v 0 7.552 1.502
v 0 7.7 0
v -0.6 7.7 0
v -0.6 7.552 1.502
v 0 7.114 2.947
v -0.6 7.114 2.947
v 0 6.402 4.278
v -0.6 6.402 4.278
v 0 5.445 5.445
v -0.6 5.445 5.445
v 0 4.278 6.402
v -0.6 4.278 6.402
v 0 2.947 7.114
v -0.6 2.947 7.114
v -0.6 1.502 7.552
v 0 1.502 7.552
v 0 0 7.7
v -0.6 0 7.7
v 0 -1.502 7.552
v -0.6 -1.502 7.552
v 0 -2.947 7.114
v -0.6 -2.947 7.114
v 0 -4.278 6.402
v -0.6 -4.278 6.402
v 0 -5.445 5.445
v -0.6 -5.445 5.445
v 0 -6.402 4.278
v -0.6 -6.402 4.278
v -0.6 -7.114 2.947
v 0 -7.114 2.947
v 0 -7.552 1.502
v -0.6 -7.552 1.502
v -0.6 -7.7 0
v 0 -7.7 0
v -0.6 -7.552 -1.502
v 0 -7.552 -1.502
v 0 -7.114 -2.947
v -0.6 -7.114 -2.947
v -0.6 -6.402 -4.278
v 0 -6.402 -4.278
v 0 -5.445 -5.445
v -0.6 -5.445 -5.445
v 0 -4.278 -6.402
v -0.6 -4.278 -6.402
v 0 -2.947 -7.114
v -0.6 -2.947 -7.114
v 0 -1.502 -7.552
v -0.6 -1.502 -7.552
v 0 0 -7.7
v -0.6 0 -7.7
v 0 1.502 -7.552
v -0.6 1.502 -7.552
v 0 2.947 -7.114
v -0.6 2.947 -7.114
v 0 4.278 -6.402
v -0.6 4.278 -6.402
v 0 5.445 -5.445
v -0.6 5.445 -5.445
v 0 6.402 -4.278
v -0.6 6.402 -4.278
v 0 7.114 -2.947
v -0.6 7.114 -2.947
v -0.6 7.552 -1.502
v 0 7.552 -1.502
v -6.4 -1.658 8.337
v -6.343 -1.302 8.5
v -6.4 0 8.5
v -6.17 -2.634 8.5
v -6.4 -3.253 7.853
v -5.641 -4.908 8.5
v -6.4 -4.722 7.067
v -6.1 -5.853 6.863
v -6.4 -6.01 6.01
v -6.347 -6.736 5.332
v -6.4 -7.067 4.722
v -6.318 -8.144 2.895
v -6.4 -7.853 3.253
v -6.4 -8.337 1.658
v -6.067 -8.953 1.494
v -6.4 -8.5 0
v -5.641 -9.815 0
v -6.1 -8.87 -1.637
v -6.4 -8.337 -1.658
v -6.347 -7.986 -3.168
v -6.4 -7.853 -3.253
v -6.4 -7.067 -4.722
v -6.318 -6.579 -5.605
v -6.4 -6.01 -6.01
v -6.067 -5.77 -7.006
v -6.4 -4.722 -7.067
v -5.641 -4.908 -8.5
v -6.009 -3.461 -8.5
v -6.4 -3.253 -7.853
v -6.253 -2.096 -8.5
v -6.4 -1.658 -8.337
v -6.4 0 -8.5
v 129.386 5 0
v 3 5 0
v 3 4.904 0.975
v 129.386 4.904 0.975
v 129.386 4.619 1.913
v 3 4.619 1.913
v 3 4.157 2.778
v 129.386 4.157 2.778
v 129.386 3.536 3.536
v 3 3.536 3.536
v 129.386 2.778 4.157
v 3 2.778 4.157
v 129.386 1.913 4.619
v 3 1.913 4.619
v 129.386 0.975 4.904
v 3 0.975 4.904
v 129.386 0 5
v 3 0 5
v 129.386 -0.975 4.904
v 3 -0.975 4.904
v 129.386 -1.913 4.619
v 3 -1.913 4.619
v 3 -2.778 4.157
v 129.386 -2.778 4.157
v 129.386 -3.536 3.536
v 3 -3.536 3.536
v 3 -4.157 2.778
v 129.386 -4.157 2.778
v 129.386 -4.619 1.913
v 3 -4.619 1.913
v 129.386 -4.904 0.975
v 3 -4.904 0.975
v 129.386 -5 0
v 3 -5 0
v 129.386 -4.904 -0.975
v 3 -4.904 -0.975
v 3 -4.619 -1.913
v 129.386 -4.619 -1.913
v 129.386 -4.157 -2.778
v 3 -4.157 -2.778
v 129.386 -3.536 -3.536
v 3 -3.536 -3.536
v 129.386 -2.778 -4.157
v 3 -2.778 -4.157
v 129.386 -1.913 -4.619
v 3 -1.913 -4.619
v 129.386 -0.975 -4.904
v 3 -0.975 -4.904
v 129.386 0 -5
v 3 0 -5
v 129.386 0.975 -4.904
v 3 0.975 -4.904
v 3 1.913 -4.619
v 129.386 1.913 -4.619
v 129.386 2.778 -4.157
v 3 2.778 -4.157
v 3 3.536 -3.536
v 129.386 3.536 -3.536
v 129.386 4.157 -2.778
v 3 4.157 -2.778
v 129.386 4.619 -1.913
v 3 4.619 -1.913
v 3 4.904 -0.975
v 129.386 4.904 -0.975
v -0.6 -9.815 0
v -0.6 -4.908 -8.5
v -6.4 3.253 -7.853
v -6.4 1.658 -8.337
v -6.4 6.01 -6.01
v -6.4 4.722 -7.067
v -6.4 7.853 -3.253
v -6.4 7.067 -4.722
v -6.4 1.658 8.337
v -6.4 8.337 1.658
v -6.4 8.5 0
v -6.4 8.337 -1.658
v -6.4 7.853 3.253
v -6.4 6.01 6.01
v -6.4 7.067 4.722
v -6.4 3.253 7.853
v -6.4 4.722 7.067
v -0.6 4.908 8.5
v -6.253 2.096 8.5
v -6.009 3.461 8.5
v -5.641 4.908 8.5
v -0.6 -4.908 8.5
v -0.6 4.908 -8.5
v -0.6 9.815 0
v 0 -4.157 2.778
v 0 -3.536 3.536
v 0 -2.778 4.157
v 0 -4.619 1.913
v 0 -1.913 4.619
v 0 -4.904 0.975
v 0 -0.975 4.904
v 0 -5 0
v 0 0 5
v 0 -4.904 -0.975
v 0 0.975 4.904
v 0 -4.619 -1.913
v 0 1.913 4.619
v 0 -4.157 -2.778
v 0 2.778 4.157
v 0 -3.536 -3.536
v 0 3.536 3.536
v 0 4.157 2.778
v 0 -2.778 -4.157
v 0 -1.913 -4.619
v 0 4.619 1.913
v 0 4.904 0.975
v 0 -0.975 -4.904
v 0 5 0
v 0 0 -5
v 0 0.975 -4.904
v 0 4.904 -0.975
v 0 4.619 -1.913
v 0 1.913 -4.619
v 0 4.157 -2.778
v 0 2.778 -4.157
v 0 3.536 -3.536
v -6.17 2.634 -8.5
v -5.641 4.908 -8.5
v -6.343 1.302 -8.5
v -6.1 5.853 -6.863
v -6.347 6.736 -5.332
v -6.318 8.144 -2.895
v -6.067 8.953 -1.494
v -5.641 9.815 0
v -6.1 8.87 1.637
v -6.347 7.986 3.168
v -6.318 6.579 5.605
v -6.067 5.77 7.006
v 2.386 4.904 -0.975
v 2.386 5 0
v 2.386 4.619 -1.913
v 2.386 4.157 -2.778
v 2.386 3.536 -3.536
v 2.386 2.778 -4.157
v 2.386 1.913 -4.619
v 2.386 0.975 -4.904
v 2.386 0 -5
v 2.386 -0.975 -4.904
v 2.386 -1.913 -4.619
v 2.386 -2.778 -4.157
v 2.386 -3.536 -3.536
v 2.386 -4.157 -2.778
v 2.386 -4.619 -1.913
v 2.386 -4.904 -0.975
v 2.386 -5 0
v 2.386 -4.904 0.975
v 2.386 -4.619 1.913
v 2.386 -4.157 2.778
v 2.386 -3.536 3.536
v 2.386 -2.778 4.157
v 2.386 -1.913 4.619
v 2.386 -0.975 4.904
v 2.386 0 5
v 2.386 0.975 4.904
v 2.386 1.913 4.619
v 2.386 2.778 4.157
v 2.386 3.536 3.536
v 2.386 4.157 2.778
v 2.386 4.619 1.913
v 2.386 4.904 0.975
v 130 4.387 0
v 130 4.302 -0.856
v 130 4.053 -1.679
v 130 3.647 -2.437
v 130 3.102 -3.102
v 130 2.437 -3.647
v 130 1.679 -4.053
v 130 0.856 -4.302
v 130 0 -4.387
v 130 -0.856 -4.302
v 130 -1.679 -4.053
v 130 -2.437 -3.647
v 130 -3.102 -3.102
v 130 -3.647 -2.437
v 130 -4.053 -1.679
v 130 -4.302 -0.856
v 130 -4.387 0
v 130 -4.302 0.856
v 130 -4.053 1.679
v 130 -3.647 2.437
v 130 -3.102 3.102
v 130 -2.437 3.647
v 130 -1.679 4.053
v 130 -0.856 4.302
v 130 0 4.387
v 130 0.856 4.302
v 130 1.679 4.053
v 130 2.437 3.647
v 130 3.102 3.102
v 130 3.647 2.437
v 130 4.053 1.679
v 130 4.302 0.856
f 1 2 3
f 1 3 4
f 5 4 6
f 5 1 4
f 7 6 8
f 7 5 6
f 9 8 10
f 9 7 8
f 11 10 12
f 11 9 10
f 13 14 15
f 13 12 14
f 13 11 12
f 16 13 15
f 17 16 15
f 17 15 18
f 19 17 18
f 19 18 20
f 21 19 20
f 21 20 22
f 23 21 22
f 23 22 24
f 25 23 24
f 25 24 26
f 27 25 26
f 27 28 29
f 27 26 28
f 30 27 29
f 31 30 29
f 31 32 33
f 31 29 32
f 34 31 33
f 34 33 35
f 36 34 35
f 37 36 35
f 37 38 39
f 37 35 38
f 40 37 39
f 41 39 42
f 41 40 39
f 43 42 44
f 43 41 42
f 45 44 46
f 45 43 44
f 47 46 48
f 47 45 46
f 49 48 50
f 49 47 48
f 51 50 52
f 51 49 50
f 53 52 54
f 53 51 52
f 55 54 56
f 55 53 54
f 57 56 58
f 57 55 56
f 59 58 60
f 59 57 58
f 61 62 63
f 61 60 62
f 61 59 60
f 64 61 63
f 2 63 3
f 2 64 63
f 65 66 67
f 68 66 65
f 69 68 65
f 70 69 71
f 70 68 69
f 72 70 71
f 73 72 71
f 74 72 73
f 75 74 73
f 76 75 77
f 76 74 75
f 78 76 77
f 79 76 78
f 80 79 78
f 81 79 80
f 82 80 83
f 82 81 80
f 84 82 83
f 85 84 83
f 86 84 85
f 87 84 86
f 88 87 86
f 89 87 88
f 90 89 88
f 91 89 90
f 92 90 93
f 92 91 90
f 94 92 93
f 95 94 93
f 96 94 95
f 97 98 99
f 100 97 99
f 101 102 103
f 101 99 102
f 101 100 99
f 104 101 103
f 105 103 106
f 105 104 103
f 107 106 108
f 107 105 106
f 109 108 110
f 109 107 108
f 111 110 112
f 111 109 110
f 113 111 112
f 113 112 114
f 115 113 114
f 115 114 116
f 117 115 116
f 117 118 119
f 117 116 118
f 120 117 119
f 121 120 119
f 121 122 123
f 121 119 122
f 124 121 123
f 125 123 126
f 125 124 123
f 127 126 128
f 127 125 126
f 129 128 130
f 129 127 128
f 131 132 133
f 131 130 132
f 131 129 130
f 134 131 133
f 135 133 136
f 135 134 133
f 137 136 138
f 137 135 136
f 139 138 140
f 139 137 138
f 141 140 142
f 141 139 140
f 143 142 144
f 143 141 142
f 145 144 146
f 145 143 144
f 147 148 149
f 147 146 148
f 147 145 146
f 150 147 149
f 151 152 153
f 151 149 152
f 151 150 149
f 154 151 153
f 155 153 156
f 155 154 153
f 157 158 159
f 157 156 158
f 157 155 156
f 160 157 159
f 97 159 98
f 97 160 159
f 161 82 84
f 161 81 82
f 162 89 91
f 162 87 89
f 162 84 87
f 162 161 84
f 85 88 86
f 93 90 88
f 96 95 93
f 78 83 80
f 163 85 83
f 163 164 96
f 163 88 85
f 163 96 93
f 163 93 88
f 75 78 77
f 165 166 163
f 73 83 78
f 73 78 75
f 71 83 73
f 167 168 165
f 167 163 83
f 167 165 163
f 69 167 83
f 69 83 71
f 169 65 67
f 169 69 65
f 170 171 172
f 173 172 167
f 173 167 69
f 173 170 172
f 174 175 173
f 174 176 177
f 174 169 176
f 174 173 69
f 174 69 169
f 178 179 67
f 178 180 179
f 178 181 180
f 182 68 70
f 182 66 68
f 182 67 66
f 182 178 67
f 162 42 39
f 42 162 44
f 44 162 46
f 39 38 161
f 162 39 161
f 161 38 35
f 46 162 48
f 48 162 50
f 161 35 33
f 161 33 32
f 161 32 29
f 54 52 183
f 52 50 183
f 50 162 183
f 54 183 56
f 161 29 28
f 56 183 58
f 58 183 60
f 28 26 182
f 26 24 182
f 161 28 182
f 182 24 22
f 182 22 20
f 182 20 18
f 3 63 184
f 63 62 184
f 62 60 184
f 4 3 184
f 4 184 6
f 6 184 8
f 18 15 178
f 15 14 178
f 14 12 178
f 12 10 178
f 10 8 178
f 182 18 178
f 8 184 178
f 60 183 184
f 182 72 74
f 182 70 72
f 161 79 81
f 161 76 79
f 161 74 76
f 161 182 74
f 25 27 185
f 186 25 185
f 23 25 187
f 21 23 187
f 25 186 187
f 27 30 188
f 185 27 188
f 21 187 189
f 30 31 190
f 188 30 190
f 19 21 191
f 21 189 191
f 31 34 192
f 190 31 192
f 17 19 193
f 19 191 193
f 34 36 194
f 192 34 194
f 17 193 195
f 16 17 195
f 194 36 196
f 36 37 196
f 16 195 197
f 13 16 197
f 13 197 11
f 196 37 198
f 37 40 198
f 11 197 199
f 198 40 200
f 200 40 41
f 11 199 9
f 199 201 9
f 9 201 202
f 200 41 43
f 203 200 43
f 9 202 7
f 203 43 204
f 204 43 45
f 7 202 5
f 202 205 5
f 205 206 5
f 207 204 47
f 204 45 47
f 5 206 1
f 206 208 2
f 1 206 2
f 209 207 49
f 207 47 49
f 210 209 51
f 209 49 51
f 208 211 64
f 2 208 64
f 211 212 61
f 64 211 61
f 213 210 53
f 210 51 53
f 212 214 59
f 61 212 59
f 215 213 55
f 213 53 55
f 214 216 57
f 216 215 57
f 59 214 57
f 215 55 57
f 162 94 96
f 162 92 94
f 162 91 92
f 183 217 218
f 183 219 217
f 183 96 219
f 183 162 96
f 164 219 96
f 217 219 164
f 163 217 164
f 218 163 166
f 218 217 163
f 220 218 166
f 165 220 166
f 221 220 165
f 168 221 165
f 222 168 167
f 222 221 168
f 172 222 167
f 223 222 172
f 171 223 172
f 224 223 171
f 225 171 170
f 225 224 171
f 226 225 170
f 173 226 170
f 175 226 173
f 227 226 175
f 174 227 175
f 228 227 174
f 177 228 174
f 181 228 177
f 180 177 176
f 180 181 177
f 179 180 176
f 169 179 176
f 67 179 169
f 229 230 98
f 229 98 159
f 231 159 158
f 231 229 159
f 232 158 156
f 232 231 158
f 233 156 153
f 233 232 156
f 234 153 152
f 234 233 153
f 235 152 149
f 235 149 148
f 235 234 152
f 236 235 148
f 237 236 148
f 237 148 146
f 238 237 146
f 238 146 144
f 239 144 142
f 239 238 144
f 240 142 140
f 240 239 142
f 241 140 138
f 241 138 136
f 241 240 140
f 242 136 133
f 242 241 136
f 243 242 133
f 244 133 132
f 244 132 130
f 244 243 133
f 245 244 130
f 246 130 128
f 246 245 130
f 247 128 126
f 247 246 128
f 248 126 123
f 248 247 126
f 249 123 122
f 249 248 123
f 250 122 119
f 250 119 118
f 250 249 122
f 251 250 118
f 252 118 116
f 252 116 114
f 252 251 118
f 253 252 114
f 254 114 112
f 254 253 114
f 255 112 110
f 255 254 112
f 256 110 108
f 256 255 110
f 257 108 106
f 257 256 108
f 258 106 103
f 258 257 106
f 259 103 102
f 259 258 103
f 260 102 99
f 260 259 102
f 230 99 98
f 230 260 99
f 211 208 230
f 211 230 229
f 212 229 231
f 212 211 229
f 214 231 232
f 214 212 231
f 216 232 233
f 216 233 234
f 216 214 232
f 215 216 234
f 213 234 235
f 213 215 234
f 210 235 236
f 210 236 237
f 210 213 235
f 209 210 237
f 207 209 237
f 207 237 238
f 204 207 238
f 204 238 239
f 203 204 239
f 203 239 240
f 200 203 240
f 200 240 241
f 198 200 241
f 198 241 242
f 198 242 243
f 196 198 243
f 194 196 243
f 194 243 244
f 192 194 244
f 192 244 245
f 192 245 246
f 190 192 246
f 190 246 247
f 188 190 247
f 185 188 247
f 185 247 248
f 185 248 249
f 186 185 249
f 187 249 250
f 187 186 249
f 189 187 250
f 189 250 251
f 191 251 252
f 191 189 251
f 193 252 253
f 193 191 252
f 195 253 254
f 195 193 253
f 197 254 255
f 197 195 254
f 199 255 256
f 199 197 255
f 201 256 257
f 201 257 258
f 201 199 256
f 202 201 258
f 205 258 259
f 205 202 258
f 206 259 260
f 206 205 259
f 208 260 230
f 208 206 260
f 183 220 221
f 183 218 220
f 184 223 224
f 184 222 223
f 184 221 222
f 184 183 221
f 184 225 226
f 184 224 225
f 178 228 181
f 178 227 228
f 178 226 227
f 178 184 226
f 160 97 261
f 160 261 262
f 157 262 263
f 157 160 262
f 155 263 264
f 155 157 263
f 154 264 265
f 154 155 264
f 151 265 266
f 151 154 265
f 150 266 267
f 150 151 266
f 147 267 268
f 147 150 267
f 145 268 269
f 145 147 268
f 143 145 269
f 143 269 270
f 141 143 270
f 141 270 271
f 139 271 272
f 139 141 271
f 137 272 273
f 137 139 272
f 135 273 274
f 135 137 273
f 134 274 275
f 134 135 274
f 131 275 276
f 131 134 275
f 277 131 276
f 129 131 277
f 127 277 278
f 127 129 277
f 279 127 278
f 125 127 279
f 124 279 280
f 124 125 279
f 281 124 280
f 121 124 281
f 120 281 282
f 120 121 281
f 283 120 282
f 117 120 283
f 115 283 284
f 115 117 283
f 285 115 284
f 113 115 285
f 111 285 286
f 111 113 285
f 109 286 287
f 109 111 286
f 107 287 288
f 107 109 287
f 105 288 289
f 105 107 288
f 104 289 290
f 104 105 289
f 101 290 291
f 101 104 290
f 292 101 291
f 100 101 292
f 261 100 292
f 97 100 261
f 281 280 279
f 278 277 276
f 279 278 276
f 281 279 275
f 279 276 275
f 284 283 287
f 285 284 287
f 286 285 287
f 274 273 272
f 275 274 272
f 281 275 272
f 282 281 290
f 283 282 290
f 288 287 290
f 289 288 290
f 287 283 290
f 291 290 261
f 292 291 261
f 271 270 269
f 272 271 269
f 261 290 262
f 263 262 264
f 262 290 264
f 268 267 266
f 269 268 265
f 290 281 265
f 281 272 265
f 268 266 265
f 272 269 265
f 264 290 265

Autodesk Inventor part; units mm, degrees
ref_plane "YZ Plane" through (0, 0, 0) normal (1, 0, 0) x (0, 1, 0)
ref_plane "XZ Plane" through (0, 0, 0) normal (0, 1, 0) x (-1, 0, 0)
sketch "Sketch1" plane through (0, 0, 0) normal (0, 0, 1) x (1, 0, 0)
  line L0 (0, 7.7) -> (0, 5)
  line L1 (3, 5) -> (130, 5)
  line L2 (130, 5) -> (130, 0)
  line L3 (130, 0) -> (-0.6001, 0)
  line L4 (-26.7201, 0) -> (156.12, 0) projected
  line L5 (-0.6001, 0) -> (-0.6001, 7.7)
  line L6 (-0.6001, 7.7) -> (0, 7.7)
  line L7 (3, 5) -> (2.3864, 5)
  line L8 (2.3864, 5) -> (0, 5)
  line L9 (0, -1.54) -> (0, 9.24) projected
  dimension "d0" = 130
  dimension "d1" = 127
  dimension "d2" = 10
  dimension "d9" = 0.6001
  dimension "d10" = 15.4
  dimension "d13" = 0.6136
  dimension "d14" = 10
revolve "Body" add sketch "Sketch1" angle 360 about axis through (130, 0, 0) along (-1, 0, 0)
sketch "Sketch2" plane through (-0.6001, 0, 0) normal (-1, 0, 0) x (0, 0, 1)
  line L0 (0, 9.815) -> (8.5, 4.9075)
  line L1 (8.5, 4.9075) -> (8.5, -4.9075)
  line L2 (8.5, -4.9075) -> (0, -9.815)
  line L3 (0, -9.815) -> (-8.5, -4.9075)
  line L4 (-8.5, -4.9075) -> (-8.5, 4.9075)
  line L5 (-8.5, 4.9075) -> (0, 9.815)
  point P0 (0, 0)
  point P1 (0, 0)
  dimension "d11" = 17
extrude "Head" add sketch "Sketch2" along normal blind 5.8
sketch "Sketch4" plane through (0, 0, 0) normal (0, 0, 1) x (1, 0, 0)
  line L0 (-6.4001, 8.5) -> (-6.4001, 9.815)
  line L1 (-6.4001, 9.815) -> (-5.6409, 9.815)
  line L2 (-5.6409, 9.815) -> (-6.4001, 8.5)
  line L3 (-7.5601, 0) -> (0.5599, 0) projected
  line L4 (-0.6001, 9.815) -> (-6.4001, 9.815) projected
  line L5 (-6.4001, 4.9075) -> (-6.4001, 9.815) projected
  dimension "d5" = 30
  dimension "d19" = 17
revolve "Chamfer1" cut sketch "Sketch4" angle 360 about axis through (-10, 0, 0) along (1, 0, 0)
thread "Thread" size "M10x1" class "6g" standard "ISO Metric profile" length 127
chamfer "Chamfer2" distance 0.6134 distance2 0.6136 1 edges at (130, -5, 0) measured on face at (130, -1.4758, -0.7745)
ref_plane "Work Plane1" through (1.525, 0, 0) normal (0, 0, 1) x (1, 0, 0)
equation "\"d0\" = NLG"
equation "\"d1\" = GEL"
equation "\"d2\" = GD"
equation "\"d10\" = SD2"
equation "\"d14\" = BDM"
equation "\"d11\" = SW"
equation "\"d3\" = KOH - SD"
equation "\"d5\" = ANG1"
equation "\"d19\" = SW0"
equation "\"d15\" = GEL"
equation "\"d6\" = -0.5 * SPD + 0.5 * GD"
equation "\"NLG\" = 130"
equation "\"GD\" = NND"
equation "\"BDM\" = NND"
equation "\"KOH\" = 6.4"
equation "\"GEL\" = 127"
equation "\"SW\" = 17"
equation "\"SW0\" = 17"
equation "\"SPD\" = NND - 1.2269 * PTC"
equation "\"SD2\" = 15.4"
equation "\"SD\" = 0.6"
equation "\"ANG1\" = 30deg"
equation "\"GAL\" = 0.61345 * PTC"
equation "\"GUL\" = 0.61345 * PTC"
equation "\"RR\" = 0"
equation "\"GD1\" = THREADDIA - 1.2269 * PTC"
equation "\"TOA\" = 30deg"
equation "\"FAWI\" = 45deg"
equation "\"PTC\" = 1"
equation "\"E0\" = 1.155 * SW"
equation "\"NND\" = 10"
equation "\"THREADDIA\" = 10"
properties part number "DIN 961 - M10 x 130" material "Steel, Mild"
